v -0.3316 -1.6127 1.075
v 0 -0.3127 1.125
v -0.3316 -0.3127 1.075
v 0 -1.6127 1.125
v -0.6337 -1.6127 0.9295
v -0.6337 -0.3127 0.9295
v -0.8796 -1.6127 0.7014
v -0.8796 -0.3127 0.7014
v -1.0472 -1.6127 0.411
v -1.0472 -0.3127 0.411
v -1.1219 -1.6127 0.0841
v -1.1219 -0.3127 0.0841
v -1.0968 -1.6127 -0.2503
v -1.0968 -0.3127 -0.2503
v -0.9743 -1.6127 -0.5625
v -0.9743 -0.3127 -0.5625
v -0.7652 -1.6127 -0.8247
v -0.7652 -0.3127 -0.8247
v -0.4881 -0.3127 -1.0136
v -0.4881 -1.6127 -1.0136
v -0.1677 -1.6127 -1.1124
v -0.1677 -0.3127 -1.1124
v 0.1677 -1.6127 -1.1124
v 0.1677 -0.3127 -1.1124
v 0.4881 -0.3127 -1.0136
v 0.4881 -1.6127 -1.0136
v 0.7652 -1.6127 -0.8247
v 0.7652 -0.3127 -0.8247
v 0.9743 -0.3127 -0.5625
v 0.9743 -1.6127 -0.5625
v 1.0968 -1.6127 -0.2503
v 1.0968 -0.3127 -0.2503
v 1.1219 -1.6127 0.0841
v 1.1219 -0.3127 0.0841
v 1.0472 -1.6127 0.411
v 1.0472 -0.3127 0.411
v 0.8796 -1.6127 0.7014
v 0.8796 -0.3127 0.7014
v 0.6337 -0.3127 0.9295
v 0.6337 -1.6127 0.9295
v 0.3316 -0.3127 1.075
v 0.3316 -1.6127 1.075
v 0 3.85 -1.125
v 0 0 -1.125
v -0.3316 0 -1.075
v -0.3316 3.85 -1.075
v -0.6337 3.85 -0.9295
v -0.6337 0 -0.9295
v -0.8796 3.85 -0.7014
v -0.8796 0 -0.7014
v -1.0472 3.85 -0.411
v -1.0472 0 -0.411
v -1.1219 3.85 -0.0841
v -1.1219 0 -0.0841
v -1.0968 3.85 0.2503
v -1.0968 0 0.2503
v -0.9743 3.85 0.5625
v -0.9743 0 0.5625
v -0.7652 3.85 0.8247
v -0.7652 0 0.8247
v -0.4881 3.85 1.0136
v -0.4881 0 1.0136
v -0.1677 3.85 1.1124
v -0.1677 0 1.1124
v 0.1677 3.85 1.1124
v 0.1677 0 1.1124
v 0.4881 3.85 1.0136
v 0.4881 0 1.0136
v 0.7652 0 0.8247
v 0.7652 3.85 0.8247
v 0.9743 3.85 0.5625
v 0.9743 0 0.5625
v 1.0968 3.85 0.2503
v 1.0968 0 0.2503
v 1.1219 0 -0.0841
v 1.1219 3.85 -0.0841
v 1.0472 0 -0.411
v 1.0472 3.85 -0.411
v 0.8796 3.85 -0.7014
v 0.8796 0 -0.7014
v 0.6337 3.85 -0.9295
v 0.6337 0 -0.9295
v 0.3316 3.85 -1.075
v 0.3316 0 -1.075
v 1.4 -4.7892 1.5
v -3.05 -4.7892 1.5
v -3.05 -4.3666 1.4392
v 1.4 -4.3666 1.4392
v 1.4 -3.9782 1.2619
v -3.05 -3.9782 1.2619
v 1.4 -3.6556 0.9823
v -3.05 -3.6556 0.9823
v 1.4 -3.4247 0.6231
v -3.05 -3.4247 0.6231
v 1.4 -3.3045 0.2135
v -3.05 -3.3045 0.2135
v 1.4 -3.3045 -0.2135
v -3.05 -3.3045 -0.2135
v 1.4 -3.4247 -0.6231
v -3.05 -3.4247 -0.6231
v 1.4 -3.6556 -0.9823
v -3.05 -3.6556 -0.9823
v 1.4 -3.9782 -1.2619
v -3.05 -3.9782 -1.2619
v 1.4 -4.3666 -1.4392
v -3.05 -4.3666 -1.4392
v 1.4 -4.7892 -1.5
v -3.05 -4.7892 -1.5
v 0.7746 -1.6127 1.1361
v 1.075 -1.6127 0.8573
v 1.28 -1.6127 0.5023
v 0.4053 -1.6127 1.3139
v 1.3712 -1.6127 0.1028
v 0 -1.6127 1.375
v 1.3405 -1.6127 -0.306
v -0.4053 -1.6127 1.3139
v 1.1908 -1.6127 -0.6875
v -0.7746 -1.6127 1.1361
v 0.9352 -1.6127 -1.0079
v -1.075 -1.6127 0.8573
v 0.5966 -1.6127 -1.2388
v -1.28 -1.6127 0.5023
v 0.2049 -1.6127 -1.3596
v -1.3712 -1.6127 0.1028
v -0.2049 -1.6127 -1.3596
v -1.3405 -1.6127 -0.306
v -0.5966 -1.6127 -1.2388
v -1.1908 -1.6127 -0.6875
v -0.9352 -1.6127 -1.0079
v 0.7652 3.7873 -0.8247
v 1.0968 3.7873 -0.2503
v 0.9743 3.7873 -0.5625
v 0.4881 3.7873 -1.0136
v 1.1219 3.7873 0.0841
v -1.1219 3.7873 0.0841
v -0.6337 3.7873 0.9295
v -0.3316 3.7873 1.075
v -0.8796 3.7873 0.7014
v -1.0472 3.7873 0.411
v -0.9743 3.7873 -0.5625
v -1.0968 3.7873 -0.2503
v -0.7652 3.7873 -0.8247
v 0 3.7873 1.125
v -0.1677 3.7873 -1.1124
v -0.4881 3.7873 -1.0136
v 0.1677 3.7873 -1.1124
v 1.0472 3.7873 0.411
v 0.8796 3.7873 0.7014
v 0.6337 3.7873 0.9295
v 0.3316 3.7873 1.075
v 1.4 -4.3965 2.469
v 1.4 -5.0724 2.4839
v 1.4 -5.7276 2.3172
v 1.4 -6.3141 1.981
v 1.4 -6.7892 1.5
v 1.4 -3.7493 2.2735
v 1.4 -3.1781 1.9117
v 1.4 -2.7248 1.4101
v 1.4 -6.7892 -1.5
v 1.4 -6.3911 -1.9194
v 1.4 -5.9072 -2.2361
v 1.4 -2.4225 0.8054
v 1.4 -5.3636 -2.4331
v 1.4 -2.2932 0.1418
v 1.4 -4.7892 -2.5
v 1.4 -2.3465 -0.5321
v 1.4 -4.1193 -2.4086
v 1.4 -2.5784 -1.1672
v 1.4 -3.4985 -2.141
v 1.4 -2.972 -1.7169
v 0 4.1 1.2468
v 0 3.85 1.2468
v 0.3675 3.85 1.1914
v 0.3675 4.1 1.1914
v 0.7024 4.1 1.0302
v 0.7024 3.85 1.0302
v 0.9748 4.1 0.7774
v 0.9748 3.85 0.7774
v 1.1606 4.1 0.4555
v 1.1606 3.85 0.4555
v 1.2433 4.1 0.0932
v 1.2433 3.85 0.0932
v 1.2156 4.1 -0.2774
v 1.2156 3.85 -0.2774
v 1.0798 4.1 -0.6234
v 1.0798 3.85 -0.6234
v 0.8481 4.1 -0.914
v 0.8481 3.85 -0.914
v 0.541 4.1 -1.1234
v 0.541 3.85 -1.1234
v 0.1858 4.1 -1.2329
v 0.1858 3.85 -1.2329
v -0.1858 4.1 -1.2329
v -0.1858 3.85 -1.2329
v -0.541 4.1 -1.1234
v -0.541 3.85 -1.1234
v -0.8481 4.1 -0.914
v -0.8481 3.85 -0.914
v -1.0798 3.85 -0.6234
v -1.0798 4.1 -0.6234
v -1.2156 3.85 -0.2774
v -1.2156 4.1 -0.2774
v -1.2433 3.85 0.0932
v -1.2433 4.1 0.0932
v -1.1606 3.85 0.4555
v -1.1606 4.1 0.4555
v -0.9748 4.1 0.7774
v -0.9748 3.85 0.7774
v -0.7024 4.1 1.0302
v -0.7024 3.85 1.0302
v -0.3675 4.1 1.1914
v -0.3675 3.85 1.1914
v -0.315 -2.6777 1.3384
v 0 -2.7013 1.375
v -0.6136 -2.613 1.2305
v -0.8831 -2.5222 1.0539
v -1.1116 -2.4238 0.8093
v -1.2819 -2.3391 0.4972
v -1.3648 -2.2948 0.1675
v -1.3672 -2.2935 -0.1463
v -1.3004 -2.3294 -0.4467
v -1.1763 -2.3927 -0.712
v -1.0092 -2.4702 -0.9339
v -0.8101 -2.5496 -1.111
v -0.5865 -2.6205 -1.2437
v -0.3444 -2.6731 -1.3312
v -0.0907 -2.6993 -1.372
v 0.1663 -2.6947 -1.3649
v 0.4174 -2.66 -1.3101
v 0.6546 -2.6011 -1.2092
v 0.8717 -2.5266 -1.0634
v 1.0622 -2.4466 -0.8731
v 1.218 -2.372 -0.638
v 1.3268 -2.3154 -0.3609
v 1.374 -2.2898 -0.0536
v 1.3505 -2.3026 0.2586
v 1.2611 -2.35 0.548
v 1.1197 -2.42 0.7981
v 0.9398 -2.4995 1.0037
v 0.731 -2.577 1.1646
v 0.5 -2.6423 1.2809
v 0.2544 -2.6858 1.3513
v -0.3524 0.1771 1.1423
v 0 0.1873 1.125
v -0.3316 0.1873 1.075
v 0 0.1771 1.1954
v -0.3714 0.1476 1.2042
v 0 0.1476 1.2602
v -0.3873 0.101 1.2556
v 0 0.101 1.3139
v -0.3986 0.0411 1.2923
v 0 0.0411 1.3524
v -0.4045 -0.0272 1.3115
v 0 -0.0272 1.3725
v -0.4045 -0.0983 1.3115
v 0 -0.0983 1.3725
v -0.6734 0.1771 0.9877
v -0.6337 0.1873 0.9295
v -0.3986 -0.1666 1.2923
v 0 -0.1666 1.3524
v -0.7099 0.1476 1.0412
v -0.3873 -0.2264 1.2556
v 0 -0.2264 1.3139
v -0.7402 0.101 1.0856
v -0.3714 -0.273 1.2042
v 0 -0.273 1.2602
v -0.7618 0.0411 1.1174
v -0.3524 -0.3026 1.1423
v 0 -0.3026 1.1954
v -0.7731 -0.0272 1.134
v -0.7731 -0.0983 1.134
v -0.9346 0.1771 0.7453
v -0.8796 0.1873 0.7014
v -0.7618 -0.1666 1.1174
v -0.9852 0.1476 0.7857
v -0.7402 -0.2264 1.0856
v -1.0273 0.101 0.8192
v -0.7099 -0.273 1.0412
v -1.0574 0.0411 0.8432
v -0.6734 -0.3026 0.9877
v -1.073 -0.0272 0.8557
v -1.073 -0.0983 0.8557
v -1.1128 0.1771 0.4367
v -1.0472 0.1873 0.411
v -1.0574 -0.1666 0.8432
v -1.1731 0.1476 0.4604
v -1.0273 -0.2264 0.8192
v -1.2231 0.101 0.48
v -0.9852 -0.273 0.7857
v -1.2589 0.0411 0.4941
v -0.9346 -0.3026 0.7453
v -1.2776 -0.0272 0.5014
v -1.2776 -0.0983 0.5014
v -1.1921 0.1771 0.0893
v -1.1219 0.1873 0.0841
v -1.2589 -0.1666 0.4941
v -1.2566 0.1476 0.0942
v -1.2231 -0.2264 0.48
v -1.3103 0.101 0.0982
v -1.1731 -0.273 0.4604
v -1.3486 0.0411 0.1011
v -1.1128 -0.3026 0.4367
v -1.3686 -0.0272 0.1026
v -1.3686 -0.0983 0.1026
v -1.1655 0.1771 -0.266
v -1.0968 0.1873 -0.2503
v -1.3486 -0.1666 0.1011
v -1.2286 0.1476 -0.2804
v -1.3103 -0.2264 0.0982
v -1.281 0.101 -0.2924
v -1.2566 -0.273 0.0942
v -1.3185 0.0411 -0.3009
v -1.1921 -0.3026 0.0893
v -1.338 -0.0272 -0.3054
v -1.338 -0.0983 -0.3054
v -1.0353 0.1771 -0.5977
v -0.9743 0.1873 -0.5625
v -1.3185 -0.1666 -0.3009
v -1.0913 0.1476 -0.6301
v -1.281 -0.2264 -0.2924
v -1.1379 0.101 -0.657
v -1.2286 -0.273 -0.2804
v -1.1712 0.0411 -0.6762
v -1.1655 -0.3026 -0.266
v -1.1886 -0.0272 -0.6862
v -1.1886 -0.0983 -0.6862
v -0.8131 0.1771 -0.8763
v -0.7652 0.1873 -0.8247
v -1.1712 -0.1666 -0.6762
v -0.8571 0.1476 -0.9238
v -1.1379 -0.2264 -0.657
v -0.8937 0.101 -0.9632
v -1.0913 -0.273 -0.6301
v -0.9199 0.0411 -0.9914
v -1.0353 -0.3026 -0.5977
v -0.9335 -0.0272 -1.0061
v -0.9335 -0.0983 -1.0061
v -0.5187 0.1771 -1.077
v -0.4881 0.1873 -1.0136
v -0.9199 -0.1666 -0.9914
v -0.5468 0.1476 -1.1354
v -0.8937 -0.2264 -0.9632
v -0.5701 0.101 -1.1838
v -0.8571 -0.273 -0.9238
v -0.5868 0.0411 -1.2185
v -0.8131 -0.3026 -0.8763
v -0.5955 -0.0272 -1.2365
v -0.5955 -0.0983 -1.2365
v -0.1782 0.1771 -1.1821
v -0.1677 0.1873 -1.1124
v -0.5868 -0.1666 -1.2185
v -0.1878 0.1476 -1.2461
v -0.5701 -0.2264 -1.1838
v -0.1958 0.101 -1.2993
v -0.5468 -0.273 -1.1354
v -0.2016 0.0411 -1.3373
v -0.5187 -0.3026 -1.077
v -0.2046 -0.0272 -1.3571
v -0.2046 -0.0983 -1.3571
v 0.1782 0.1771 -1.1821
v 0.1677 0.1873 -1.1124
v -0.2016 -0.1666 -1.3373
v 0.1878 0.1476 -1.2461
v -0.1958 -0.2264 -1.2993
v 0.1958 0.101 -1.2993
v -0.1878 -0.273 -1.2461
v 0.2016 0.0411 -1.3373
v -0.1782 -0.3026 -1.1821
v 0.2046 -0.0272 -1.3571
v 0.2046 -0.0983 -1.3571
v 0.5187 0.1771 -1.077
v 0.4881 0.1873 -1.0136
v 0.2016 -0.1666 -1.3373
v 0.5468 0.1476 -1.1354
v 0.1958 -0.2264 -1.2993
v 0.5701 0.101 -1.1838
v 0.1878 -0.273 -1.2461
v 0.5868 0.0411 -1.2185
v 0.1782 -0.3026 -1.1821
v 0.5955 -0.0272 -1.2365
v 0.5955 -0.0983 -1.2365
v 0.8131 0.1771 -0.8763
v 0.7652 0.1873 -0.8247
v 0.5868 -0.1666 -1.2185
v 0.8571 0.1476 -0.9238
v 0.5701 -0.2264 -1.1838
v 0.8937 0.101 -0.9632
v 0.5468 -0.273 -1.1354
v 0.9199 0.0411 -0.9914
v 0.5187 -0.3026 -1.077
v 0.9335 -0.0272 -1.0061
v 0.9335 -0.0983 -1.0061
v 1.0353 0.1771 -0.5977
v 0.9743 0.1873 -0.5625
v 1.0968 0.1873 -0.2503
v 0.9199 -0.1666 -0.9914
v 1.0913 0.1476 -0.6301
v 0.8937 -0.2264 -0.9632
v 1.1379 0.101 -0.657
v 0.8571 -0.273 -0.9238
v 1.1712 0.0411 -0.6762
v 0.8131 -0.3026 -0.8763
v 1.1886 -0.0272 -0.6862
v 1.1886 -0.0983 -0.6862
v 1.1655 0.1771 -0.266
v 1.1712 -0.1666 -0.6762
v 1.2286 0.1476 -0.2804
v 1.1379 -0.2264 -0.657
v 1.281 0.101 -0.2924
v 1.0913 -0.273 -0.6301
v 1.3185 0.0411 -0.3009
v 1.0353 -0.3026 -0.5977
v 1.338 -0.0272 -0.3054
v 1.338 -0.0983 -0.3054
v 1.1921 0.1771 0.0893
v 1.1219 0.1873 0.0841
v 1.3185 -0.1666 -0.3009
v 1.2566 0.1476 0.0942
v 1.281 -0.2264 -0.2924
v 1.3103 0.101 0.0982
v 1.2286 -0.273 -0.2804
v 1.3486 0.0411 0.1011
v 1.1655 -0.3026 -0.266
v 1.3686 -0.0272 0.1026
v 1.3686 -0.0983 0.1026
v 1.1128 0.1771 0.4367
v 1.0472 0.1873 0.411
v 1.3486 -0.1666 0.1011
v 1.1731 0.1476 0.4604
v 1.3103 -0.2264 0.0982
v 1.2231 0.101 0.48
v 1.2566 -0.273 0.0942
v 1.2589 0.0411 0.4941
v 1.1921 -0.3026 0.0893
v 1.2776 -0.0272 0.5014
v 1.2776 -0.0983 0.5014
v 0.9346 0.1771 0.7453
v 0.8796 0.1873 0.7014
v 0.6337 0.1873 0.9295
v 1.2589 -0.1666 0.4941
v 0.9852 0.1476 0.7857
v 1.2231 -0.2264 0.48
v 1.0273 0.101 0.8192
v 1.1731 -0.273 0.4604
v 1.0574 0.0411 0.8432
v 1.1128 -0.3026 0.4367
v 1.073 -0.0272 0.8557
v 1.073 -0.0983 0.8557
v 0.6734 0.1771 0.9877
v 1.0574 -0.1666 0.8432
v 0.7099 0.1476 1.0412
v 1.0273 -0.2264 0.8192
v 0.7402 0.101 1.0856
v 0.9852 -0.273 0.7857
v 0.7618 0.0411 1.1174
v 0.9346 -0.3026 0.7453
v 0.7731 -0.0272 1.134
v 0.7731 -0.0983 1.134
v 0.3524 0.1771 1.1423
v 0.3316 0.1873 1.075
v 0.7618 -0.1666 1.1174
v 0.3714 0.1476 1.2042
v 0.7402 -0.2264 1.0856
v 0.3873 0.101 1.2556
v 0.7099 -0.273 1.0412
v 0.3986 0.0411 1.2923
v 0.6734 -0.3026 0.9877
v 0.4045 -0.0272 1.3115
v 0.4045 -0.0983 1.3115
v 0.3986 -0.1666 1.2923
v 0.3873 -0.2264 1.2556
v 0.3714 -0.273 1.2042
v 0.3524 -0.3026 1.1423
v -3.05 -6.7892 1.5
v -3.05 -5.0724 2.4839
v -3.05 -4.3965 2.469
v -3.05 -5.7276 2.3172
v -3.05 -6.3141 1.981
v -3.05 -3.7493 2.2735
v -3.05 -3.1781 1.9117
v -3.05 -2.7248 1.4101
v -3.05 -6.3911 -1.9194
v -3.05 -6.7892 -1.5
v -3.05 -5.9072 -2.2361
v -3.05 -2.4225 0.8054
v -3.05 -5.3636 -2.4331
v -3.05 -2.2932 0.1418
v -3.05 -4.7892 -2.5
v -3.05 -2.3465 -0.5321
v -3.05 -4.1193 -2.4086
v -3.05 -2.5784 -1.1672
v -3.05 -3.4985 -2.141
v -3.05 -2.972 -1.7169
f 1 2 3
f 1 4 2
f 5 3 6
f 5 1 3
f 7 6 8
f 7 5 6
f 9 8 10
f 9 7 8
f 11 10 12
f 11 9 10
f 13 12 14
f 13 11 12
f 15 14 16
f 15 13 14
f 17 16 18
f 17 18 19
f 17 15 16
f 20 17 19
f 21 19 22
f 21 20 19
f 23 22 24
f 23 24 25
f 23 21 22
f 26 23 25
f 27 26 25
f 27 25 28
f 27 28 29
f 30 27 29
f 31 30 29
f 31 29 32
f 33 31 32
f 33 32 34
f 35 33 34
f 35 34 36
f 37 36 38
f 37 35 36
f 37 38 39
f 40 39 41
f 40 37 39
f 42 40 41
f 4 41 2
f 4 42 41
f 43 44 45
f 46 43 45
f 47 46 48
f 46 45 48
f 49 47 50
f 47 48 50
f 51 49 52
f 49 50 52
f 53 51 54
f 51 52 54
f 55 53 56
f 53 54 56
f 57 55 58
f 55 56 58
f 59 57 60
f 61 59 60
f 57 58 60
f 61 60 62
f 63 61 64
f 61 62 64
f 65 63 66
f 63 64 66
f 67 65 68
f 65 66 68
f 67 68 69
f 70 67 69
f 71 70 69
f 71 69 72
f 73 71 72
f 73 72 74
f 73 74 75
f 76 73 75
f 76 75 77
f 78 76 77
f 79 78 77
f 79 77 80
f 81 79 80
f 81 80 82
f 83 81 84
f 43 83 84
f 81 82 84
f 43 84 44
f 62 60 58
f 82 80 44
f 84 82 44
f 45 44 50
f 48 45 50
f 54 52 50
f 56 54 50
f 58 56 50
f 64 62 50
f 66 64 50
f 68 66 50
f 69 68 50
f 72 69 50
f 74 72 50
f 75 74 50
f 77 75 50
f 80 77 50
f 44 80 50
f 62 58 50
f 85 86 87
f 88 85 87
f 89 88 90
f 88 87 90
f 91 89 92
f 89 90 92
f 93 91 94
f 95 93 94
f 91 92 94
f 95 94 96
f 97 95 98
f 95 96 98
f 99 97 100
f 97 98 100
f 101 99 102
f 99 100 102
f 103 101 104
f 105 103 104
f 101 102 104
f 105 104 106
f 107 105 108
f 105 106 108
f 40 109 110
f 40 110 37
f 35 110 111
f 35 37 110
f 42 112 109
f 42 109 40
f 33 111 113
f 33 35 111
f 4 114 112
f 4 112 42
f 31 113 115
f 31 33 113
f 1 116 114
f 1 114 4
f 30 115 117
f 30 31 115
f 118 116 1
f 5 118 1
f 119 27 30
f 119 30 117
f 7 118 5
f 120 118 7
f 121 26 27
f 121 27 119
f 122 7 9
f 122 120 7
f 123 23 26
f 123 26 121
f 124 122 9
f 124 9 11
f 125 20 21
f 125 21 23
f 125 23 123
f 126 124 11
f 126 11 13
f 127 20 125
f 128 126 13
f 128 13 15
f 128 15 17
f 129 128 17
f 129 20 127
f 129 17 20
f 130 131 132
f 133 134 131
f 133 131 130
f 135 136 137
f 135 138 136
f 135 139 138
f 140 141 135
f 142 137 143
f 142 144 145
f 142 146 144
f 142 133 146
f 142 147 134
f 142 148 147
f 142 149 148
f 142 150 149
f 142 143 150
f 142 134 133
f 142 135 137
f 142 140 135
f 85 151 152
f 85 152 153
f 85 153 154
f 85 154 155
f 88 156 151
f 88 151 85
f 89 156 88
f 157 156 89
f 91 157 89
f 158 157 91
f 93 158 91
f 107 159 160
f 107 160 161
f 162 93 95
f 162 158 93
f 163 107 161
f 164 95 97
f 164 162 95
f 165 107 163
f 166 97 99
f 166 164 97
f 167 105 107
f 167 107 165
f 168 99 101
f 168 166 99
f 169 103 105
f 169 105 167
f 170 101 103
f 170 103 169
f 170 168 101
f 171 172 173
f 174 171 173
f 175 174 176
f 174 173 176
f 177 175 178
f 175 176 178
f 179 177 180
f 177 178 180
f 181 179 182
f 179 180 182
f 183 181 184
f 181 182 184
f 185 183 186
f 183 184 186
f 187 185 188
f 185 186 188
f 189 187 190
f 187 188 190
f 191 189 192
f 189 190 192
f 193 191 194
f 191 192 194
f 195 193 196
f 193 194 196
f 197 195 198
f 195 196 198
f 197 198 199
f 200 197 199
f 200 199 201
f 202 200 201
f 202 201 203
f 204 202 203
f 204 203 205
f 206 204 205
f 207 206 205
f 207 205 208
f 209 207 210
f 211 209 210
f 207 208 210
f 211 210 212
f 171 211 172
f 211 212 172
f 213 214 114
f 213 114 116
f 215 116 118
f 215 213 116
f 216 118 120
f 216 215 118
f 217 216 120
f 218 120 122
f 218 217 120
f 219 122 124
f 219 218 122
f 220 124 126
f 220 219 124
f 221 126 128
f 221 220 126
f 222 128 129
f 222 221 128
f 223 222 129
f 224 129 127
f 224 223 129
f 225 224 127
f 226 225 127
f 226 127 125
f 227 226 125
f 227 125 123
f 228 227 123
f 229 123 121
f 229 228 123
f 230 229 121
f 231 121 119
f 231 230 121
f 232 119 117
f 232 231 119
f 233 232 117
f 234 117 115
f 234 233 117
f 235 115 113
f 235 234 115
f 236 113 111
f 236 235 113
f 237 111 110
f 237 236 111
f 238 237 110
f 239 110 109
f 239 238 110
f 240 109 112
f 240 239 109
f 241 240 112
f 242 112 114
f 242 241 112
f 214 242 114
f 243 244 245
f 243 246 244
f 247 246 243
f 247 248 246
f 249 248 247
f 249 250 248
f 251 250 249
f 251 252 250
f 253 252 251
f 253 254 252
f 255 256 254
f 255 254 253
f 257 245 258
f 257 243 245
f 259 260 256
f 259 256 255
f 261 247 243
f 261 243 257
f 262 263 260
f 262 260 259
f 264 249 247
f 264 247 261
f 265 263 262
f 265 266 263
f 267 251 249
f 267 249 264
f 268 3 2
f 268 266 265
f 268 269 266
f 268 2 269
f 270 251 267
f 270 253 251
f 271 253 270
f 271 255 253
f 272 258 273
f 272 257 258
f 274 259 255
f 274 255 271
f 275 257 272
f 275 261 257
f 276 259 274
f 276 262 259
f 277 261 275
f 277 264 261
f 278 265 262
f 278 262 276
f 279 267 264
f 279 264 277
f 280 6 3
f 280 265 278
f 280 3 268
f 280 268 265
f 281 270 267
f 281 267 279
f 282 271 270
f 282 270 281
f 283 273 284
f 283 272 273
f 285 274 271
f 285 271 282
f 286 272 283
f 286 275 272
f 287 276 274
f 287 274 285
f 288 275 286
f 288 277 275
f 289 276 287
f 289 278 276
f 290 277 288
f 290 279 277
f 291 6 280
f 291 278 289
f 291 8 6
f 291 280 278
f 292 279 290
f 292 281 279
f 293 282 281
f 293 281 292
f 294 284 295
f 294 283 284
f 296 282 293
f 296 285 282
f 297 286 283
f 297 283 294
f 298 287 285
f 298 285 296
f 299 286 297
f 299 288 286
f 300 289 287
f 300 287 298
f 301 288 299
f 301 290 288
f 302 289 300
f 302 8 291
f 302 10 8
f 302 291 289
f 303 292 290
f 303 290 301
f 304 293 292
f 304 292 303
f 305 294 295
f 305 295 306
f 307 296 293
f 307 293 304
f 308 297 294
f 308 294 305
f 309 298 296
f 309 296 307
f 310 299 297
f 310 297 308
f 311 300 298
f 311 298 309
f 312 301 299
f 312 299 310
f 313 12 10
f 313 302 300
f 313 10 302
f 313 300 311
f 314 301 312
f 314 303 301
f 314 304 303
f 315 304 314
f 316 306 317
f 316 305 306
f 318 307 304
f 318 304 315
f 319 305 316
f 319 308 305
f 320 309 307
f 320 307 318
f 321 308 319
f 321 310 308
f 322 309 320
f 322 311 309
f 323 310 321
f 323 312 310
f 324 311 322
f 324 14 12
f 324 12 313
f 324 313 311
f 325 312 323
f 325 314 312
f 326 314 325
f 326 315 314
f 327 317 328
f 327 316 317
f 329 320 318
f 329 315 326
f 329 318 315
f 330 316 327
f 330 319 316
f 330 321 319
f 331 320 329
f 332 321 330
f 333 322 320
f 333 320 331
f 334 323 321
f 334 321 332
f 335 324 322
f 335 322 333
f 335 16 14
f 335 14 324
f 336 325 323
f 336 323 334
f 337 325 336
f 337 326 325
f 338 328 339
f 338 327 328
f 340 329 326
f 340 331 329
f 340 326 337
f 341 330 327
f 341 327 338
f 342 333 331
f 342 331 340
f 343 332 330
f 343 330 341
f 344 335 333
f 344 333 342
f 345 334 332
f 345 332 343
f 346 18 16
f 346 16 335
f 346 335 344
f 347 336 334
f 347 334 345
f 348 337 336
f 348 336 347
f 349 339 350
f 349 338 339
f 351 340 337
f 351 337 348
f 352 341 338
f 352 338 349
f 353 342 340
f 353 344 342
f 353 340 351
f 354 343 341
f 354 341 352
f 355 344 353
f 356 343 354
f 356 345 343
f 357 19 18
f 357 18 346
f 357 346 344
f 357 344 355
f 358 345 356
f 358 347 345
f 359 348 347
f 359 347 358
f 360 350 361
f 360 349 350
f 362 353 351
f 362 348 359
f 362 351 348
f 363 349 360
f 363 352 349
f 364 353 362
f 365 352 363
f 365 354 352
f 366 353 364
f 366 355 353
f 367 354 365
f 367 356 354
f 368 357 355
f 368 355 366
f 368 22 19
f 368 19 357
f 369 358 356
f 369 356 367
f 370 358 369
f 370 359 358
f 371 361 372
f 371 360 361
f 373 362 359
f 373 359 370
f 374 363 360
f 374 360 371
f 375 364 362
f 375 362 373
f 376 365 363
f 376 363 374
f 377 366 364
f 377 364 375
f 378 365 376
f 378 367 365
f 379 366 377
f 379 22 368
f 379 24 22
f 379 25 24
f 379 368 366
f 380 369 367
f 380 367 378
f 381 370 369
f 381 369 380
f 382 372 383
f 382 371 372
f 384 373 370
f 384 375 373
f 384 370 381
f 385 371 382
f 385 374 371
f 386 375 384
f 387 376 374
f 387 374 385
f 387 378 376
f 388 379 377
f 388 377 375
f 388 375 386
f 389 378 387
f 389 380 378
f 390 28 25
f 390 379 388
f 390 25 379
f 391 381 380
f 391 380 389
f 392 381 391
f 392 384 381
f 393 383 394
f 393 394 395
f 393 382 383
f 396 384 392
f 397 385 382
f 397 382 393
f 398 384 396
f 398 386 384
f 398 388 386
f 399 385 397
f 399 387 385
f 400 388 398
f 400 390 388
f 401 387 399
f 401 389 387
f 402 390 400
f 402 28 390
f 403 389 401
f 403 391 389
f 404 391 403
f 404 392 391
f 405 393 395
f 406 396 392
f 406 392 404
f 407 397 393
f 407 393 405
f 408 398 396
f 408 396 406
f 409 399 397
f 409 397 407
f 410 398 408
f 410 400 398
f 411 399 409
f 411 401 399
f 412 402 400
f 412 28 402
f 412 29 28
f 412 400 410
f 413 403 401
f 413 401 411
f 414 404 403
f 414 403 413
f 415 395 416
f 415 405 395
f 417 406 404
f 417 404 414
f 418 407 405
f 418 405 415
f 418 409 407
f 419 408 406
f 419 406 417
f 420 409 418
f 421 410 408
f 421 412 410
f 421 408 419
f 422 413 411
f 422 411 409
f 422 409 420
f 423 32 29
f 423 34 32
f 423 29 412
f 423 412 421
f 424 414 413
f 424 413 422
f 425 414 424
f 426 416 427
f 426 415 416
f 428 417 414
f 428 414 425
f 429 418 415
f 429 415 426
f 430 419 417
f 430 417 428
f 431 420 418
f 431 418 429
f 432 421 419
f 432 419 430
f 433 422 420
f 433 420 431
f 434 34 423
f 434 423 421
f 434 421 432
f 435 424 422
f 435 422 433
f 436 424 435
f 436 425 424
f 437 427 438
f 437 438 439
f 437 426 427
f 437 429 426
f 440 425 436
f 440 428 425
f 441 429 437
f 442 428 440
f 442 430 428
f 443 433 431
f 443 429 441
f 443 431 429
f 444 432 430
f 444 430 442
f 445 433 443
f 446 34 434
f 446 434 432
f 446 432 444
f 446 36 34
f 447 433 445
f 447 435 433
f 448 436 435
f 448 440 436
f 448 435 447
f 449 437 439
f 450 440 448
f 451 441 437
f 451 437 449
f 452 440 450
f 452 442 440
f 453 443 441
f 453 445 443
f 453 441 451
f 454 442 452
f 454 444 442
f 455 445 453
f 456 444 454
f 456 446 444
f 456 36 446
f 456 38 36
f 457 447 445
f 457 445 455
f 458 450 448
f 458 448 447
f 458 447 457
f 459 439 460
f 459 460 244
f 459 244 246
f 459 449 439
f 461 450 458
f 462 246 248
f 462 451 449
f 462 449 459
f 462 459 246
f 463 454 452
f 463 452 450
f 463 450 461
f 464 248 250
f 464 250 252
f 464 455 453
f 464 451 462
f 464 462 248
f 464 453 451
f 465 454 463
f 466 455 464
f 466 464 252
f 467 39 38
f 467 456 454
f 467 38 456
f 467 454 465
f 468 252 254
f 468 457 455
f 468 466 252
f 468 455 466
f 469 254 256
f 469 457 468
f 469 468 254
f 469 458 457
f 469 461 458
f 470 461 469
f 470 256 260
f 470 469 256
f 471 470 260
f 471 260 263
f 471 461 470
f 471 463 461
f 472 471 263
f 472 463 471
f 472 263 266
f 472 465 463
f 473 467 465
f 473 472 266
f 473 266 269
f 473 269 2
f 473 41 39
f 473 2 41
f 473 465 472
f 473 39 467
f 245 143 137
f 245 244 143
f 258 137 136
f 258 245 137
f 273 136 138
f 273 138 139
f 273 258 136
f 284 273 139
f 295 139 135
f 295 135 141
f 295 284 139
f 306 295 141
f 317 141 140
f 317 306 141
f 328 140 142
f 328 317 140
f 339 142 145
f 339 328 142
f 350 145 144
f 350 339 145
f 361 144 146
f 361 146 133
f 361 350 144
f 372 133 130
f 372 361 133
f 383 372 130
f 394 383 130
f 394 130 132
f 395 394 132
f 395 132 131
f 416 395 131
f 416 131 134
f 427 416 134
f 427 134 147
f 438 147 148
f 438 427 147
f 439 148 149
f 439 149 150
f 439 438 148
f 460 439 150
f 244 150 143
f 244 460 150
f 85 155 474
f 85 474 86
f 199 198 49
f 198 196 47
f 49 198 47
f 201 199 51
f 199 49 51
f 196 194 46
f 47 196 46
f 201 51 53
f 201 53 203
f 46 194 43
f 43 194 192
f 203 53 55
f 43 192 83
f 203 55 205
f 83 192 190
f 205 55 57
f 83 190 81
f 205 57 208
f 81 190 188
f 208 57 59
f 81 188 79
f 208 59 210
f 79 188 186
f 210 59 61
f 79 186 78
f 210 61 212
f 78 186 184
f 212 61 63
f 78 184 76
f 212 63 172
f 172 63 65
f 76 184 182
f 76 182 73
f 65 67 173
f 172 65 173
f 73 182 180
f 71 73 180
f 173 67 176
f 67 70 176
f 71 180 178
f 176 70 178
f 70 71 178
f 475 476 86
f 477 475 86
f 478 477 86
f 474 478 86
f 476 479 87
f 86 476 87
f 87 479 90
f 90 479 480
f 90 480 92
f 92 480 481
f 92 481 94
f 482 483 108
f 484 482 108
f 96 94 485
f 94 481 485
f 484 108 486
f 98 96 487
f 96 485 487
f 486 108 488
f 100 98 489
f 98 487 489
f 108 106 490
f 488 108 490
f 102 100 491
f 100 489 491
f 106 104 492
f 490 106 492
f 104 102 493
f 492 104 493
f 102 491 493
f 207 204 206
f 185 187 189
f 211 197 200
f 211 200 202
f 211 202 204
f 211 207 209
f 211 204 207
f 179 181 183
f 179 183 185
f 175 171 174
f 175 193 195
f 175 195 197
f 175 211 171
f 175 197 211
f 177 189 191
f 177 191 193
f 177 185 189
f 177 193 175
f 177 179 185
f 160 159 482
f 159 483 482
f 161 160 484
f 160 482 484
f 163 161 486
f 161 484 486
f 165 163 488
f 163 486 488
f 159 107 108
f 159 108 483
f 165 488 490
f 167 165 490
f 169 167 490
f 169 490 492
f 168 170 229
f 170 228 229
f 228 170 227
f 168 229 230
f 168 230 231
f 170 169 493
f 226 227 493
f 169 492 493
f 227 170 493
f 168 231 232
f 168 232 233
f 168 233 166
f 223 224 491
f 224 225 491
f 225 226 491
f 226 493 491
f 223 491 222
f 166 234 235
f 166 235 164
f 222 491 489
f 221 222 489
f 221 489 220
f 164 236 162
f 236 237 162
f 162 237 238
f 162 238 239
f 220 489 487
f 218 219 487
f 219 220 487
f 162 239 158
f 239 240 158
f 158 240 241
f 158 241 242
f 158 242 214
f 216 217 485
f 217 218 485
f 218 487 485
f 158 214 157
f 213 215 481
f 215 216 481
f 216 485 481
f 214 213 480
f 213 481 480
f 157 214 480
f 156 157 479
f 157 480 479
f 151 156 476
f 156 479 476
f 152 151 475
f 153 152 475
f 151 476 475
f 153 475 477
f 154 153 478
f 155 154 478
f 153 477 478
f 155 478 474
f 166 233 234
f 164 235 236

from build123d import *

# Parameters (mm, degrees)
BOSS_EXTRUDE3_DEPTH      = 1.4
BOSS_EXTRUDE3_DEPTH_BACK = 3.05
SKETCH6_R                = 2.5
CUT_EXTRUDE1_DEPTH       = 4.45
SKETCH2_R                = 1.125
BOSS_EXTRUDE1_DEPTH      = 3.85
SKETCH3_R                = 1.246833692
BOSS_EXTRUDE2_DEPTH      = 0.25


with BuildPart() as part:
    # Sketch4 → Revolve1 (revolve)
    with BuildSketch(Plane.XY, mode=Mode.PRIVATE) as revolve1_sk:
        with BuildLine():
            Line((0, 3.787270611), (1.125, 3.787270611))
            Line((1.125, 3.787270611), (1.125, 0.187270611))
            ThreePointArc((1.125, 0.187270611), (1.375, -0.062729389), (1.125, -0.312729389))
            Line((1.125, -0.312729389), (1.125, -1.612729389))
            Line((1.125, -1.612729389), (1.375, -1.612729389))
            Line((1.375, -1.612729389), (1.375, -2.712729389))
            Line((1.375, -2.712729389), (0, -2.712729389))
            Line((0, -2.712729389), (0, 3.787270611))
        make_face()
    revolve(revolve1_sk.sketch.rotate(Axis((0, 4.060864589, 0), (0, -1, 0)), 90), axis=Axis((0, 4.060864589, 0), (0, -1, 0)))

    # Sketch6 → Boss-Extrude3 (add, two sides: drawn at the far end of the back side and taken through both)
    with BuildSketch(Plane(origin=(0, 0, 0), x_dir=(0, 0, -1), z_dir=(1, 0, 0)).offset(-BOSS_EXTRUDE3_DEPTH_BACK)):
        with Locations((0, -4.789190855)):
            Circle(SKETCH6_R)
    extrude(amount=BOSS_EXTRUDE3_DEPTH + BOSS_EXTRUDE3_DEPTH_BACK)

    # Sketch7 → Cut-Extrude1 (cut)
    with BuildSketch(Plane.ZY.offset(3.05)):
        with BuildLine():
            Line((-1.5, -4.789190855), (-1.5, -7.570753065))
            Line((-1.5, -7.570753065), (1.5, -7.570753065))
            Line((1.5, -7.570753065), (1.5, -4.789190855))
            ThreePointArc((1.5, -4.789190855), (0, -3.289190855), (-1.5, -4.789190855))
        make_face()
    extrude(amount=-CUT_EXTRUDE1_DEPTH, mode=Mode.SUBTRACT)


with BuildPart() as body_2:
    # Sketch2 → Boss-Extrude1 (new body)
    with BuildSketch(Plane(origin=(0, 0, 0), x_dir=(1, 0, 0), z_dir=(0, 1, 0))):
        with Locations(Location((0, 0, 0), (0, 0, 90))):
            Circle(SKETCH2_R)
    extrude(amount=BOSS_EXTRUDE1_DEPTH)

    # Sketch3 → Boss-Extrude2 (add)
    with BuildSketch(Plane(origin=(0, 3.85, 0), x_dir=(1, 0, 0), z_dir=(0, 1, 0))):
        with Locations(Location((0, 0, 0), (0, 0, 270))):
            Circle(SKETCH3_R)
    extrude(amount=BOSS_EXTRUDE2_DEPTH)


solid = Compound([part.part, body_2.part])
